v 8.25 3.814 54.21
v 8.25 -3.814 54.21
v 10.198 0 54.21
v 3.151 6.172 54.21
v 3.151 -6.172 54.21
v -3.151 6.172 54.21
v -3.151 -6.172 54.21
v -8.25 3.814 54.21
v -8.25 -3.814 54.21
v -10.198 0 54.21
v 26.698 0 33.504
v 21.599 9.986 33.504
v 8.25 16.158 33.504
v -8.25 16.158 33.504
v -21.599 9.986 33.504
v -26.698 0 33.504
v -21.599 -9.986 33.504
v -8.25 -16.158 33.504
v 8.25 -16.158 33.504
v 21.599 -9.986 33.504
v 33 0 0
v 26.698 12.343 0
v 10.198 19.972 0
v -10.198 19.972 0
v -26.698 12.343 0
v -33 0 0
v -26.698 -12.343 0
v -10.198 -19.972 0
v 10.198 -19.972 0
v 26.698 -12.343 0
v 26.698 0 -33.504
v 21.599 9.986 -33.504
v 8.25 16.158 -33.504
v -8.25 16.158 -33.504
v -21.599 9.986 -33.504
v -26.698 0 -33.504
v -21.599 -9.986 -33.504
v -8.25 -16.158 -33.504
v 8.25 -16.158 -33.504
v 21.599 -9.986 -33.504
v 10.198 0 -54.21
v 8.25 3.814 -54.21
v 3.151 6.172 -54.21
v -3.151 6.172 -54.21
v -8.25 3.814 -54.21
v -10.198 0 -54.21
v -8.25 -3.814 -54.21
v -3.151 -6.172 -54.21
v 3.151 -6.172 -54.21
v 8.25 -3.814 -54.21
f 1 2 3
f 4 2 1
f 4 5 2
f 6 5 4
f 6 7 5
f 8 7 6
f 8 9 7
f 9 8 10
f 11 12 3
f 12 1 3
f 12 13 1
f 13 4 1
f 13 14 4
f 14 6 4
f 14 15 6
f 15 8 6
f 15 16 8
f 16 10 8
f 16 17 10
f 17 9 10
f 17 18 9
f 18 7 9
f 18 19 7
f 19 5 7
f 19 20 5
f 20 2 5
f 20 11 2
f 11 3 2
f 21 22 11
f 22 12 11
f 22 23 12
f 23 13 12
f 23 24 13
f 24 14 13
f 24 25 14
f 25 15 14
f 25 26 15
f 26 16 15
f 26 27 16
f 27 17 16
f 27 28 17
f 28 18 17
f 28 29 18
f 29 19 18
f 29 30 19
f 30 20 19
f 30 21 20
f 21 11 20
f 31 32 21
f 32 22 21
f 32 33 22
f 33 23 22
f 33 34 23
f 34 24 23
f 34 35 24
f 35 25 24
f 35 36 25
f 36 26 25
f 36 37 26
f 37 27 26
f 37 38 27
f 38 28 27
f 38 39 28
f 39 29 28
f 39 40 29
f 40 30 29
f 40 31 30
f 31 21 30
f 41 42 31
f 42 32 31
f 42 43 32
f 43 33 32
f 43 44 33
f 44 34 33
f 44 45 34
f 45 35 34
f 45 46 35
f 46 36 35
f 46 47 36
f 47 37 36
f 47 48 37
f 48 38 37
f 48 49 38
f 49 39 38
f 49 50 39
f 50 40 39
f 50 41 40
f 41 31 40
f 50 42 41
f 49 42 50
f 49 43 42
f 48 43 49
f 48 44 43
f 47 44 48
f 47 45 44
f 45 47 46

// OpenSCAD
// Generated by SolidPython 1.0.1 on 2020-07-29 00:46:49


scale(v = [11, 7, 19]) {
	sphere(r = 3);
}
/***********************************************
*********      SolidPython code:      **********
************************************************
 
# import packages: SolidPython
from solid import *
from solid.utils import *
from itertools import chain, combinations, permutations


class Resize:

    def __init__(self, scad_file):
        self.scad_file = scad_file
        #self.scad_file = import_scad(scad_file)
        # cone/cylinder param:
        self.r1 = 0
        self.r2 = 0
        self.h = 0
        # rectangular prism param:
        self.w = 0
        self.l = 0
        # ellipse param:
        self.r = 0

    # import OpenScad code (file name corresponds to shape)


    # classify shape + parameters
    def assign(self, param1, param2, param3):
        if self.scad_file == 'cone.scad':
            self.r1 = param1
            self.r2 = param2
            self.h = param3
        elif self.scad_file == 'cylinder.scad':
            self.r1 = param1
            self.r2 = param2
            self.h = param3
        elif self.scad_file == 'rectangularPrism.scad':
            self.h = param1
            self.l = param2
            self.w = param3
        else:
            self.r = param1
            self.h = param2

    # resize parameters
    def iterate(self):
        x = range(3, 20, 2)
        i = 1
        if self.scad_file == 'cone.scad':
            tempList = list(permutations(x, 2))
            for temp in tempList:
                param1 = temp[0]
                param2 = temp[1]
                filepath = 'produced_scad_files/' + 'cone' + str(param1) + '_' + str(param2) + '_' + '.scad'
                scad_render_to_file(cylinder(h=param1, r1=param2, r2=0), filepath)

        elif self.scad_file == 'cylinder.scad':
            tempList = list(permutations(x, 3))
            for temp in tempList:
                param1 = temp[0]
                param2 = temp[1]
                filepath = 'produced_scad_files/' + 'cylinder' + str(param1) + '_' + str(param2) + '_' + '.scad'
                scad_render_to_file(cylinder(h=param1, r1=param2, r2=param2), filepath)

        elif self.scad_file == 'rectangularPrism.scad':
            tempList = list(permutations(x, 3))
            for temp in tempList:
                param1 = temp[0]
                param2 = temp[1]
                param3 = temp[2]
                filepath = 'produced_scad_files/' + 'rectangularPrism' + str(param1) + '_' + str(param2) + '_' + str(
                    param3) + '.scad'
                scad_render_to_file(cube(size=(param1, param2, param3)), filepath)

        elif self.scad_file == 'ellipse.scad':
            tempList = list(permutations(x, 4))
            for temp in tempList:
                param1 = temp[0]
                param2 = temp[1]
                param3 = temp[2]
                param4 = temp[3]
                filepath = 'produced_scad_files/' + 'ellipse' + str(param1) + '_' + str(param2) + '_' + str(param3) + '_' + str(param4) + '.scad'
                scad_render_to_file(scale([param1, param2, param3])(sphere(r=param4)), filepath)

    def render_to_scadfile(self):
        scad_render_to_file(scad, 'example.scad') 
 
************************************************/
